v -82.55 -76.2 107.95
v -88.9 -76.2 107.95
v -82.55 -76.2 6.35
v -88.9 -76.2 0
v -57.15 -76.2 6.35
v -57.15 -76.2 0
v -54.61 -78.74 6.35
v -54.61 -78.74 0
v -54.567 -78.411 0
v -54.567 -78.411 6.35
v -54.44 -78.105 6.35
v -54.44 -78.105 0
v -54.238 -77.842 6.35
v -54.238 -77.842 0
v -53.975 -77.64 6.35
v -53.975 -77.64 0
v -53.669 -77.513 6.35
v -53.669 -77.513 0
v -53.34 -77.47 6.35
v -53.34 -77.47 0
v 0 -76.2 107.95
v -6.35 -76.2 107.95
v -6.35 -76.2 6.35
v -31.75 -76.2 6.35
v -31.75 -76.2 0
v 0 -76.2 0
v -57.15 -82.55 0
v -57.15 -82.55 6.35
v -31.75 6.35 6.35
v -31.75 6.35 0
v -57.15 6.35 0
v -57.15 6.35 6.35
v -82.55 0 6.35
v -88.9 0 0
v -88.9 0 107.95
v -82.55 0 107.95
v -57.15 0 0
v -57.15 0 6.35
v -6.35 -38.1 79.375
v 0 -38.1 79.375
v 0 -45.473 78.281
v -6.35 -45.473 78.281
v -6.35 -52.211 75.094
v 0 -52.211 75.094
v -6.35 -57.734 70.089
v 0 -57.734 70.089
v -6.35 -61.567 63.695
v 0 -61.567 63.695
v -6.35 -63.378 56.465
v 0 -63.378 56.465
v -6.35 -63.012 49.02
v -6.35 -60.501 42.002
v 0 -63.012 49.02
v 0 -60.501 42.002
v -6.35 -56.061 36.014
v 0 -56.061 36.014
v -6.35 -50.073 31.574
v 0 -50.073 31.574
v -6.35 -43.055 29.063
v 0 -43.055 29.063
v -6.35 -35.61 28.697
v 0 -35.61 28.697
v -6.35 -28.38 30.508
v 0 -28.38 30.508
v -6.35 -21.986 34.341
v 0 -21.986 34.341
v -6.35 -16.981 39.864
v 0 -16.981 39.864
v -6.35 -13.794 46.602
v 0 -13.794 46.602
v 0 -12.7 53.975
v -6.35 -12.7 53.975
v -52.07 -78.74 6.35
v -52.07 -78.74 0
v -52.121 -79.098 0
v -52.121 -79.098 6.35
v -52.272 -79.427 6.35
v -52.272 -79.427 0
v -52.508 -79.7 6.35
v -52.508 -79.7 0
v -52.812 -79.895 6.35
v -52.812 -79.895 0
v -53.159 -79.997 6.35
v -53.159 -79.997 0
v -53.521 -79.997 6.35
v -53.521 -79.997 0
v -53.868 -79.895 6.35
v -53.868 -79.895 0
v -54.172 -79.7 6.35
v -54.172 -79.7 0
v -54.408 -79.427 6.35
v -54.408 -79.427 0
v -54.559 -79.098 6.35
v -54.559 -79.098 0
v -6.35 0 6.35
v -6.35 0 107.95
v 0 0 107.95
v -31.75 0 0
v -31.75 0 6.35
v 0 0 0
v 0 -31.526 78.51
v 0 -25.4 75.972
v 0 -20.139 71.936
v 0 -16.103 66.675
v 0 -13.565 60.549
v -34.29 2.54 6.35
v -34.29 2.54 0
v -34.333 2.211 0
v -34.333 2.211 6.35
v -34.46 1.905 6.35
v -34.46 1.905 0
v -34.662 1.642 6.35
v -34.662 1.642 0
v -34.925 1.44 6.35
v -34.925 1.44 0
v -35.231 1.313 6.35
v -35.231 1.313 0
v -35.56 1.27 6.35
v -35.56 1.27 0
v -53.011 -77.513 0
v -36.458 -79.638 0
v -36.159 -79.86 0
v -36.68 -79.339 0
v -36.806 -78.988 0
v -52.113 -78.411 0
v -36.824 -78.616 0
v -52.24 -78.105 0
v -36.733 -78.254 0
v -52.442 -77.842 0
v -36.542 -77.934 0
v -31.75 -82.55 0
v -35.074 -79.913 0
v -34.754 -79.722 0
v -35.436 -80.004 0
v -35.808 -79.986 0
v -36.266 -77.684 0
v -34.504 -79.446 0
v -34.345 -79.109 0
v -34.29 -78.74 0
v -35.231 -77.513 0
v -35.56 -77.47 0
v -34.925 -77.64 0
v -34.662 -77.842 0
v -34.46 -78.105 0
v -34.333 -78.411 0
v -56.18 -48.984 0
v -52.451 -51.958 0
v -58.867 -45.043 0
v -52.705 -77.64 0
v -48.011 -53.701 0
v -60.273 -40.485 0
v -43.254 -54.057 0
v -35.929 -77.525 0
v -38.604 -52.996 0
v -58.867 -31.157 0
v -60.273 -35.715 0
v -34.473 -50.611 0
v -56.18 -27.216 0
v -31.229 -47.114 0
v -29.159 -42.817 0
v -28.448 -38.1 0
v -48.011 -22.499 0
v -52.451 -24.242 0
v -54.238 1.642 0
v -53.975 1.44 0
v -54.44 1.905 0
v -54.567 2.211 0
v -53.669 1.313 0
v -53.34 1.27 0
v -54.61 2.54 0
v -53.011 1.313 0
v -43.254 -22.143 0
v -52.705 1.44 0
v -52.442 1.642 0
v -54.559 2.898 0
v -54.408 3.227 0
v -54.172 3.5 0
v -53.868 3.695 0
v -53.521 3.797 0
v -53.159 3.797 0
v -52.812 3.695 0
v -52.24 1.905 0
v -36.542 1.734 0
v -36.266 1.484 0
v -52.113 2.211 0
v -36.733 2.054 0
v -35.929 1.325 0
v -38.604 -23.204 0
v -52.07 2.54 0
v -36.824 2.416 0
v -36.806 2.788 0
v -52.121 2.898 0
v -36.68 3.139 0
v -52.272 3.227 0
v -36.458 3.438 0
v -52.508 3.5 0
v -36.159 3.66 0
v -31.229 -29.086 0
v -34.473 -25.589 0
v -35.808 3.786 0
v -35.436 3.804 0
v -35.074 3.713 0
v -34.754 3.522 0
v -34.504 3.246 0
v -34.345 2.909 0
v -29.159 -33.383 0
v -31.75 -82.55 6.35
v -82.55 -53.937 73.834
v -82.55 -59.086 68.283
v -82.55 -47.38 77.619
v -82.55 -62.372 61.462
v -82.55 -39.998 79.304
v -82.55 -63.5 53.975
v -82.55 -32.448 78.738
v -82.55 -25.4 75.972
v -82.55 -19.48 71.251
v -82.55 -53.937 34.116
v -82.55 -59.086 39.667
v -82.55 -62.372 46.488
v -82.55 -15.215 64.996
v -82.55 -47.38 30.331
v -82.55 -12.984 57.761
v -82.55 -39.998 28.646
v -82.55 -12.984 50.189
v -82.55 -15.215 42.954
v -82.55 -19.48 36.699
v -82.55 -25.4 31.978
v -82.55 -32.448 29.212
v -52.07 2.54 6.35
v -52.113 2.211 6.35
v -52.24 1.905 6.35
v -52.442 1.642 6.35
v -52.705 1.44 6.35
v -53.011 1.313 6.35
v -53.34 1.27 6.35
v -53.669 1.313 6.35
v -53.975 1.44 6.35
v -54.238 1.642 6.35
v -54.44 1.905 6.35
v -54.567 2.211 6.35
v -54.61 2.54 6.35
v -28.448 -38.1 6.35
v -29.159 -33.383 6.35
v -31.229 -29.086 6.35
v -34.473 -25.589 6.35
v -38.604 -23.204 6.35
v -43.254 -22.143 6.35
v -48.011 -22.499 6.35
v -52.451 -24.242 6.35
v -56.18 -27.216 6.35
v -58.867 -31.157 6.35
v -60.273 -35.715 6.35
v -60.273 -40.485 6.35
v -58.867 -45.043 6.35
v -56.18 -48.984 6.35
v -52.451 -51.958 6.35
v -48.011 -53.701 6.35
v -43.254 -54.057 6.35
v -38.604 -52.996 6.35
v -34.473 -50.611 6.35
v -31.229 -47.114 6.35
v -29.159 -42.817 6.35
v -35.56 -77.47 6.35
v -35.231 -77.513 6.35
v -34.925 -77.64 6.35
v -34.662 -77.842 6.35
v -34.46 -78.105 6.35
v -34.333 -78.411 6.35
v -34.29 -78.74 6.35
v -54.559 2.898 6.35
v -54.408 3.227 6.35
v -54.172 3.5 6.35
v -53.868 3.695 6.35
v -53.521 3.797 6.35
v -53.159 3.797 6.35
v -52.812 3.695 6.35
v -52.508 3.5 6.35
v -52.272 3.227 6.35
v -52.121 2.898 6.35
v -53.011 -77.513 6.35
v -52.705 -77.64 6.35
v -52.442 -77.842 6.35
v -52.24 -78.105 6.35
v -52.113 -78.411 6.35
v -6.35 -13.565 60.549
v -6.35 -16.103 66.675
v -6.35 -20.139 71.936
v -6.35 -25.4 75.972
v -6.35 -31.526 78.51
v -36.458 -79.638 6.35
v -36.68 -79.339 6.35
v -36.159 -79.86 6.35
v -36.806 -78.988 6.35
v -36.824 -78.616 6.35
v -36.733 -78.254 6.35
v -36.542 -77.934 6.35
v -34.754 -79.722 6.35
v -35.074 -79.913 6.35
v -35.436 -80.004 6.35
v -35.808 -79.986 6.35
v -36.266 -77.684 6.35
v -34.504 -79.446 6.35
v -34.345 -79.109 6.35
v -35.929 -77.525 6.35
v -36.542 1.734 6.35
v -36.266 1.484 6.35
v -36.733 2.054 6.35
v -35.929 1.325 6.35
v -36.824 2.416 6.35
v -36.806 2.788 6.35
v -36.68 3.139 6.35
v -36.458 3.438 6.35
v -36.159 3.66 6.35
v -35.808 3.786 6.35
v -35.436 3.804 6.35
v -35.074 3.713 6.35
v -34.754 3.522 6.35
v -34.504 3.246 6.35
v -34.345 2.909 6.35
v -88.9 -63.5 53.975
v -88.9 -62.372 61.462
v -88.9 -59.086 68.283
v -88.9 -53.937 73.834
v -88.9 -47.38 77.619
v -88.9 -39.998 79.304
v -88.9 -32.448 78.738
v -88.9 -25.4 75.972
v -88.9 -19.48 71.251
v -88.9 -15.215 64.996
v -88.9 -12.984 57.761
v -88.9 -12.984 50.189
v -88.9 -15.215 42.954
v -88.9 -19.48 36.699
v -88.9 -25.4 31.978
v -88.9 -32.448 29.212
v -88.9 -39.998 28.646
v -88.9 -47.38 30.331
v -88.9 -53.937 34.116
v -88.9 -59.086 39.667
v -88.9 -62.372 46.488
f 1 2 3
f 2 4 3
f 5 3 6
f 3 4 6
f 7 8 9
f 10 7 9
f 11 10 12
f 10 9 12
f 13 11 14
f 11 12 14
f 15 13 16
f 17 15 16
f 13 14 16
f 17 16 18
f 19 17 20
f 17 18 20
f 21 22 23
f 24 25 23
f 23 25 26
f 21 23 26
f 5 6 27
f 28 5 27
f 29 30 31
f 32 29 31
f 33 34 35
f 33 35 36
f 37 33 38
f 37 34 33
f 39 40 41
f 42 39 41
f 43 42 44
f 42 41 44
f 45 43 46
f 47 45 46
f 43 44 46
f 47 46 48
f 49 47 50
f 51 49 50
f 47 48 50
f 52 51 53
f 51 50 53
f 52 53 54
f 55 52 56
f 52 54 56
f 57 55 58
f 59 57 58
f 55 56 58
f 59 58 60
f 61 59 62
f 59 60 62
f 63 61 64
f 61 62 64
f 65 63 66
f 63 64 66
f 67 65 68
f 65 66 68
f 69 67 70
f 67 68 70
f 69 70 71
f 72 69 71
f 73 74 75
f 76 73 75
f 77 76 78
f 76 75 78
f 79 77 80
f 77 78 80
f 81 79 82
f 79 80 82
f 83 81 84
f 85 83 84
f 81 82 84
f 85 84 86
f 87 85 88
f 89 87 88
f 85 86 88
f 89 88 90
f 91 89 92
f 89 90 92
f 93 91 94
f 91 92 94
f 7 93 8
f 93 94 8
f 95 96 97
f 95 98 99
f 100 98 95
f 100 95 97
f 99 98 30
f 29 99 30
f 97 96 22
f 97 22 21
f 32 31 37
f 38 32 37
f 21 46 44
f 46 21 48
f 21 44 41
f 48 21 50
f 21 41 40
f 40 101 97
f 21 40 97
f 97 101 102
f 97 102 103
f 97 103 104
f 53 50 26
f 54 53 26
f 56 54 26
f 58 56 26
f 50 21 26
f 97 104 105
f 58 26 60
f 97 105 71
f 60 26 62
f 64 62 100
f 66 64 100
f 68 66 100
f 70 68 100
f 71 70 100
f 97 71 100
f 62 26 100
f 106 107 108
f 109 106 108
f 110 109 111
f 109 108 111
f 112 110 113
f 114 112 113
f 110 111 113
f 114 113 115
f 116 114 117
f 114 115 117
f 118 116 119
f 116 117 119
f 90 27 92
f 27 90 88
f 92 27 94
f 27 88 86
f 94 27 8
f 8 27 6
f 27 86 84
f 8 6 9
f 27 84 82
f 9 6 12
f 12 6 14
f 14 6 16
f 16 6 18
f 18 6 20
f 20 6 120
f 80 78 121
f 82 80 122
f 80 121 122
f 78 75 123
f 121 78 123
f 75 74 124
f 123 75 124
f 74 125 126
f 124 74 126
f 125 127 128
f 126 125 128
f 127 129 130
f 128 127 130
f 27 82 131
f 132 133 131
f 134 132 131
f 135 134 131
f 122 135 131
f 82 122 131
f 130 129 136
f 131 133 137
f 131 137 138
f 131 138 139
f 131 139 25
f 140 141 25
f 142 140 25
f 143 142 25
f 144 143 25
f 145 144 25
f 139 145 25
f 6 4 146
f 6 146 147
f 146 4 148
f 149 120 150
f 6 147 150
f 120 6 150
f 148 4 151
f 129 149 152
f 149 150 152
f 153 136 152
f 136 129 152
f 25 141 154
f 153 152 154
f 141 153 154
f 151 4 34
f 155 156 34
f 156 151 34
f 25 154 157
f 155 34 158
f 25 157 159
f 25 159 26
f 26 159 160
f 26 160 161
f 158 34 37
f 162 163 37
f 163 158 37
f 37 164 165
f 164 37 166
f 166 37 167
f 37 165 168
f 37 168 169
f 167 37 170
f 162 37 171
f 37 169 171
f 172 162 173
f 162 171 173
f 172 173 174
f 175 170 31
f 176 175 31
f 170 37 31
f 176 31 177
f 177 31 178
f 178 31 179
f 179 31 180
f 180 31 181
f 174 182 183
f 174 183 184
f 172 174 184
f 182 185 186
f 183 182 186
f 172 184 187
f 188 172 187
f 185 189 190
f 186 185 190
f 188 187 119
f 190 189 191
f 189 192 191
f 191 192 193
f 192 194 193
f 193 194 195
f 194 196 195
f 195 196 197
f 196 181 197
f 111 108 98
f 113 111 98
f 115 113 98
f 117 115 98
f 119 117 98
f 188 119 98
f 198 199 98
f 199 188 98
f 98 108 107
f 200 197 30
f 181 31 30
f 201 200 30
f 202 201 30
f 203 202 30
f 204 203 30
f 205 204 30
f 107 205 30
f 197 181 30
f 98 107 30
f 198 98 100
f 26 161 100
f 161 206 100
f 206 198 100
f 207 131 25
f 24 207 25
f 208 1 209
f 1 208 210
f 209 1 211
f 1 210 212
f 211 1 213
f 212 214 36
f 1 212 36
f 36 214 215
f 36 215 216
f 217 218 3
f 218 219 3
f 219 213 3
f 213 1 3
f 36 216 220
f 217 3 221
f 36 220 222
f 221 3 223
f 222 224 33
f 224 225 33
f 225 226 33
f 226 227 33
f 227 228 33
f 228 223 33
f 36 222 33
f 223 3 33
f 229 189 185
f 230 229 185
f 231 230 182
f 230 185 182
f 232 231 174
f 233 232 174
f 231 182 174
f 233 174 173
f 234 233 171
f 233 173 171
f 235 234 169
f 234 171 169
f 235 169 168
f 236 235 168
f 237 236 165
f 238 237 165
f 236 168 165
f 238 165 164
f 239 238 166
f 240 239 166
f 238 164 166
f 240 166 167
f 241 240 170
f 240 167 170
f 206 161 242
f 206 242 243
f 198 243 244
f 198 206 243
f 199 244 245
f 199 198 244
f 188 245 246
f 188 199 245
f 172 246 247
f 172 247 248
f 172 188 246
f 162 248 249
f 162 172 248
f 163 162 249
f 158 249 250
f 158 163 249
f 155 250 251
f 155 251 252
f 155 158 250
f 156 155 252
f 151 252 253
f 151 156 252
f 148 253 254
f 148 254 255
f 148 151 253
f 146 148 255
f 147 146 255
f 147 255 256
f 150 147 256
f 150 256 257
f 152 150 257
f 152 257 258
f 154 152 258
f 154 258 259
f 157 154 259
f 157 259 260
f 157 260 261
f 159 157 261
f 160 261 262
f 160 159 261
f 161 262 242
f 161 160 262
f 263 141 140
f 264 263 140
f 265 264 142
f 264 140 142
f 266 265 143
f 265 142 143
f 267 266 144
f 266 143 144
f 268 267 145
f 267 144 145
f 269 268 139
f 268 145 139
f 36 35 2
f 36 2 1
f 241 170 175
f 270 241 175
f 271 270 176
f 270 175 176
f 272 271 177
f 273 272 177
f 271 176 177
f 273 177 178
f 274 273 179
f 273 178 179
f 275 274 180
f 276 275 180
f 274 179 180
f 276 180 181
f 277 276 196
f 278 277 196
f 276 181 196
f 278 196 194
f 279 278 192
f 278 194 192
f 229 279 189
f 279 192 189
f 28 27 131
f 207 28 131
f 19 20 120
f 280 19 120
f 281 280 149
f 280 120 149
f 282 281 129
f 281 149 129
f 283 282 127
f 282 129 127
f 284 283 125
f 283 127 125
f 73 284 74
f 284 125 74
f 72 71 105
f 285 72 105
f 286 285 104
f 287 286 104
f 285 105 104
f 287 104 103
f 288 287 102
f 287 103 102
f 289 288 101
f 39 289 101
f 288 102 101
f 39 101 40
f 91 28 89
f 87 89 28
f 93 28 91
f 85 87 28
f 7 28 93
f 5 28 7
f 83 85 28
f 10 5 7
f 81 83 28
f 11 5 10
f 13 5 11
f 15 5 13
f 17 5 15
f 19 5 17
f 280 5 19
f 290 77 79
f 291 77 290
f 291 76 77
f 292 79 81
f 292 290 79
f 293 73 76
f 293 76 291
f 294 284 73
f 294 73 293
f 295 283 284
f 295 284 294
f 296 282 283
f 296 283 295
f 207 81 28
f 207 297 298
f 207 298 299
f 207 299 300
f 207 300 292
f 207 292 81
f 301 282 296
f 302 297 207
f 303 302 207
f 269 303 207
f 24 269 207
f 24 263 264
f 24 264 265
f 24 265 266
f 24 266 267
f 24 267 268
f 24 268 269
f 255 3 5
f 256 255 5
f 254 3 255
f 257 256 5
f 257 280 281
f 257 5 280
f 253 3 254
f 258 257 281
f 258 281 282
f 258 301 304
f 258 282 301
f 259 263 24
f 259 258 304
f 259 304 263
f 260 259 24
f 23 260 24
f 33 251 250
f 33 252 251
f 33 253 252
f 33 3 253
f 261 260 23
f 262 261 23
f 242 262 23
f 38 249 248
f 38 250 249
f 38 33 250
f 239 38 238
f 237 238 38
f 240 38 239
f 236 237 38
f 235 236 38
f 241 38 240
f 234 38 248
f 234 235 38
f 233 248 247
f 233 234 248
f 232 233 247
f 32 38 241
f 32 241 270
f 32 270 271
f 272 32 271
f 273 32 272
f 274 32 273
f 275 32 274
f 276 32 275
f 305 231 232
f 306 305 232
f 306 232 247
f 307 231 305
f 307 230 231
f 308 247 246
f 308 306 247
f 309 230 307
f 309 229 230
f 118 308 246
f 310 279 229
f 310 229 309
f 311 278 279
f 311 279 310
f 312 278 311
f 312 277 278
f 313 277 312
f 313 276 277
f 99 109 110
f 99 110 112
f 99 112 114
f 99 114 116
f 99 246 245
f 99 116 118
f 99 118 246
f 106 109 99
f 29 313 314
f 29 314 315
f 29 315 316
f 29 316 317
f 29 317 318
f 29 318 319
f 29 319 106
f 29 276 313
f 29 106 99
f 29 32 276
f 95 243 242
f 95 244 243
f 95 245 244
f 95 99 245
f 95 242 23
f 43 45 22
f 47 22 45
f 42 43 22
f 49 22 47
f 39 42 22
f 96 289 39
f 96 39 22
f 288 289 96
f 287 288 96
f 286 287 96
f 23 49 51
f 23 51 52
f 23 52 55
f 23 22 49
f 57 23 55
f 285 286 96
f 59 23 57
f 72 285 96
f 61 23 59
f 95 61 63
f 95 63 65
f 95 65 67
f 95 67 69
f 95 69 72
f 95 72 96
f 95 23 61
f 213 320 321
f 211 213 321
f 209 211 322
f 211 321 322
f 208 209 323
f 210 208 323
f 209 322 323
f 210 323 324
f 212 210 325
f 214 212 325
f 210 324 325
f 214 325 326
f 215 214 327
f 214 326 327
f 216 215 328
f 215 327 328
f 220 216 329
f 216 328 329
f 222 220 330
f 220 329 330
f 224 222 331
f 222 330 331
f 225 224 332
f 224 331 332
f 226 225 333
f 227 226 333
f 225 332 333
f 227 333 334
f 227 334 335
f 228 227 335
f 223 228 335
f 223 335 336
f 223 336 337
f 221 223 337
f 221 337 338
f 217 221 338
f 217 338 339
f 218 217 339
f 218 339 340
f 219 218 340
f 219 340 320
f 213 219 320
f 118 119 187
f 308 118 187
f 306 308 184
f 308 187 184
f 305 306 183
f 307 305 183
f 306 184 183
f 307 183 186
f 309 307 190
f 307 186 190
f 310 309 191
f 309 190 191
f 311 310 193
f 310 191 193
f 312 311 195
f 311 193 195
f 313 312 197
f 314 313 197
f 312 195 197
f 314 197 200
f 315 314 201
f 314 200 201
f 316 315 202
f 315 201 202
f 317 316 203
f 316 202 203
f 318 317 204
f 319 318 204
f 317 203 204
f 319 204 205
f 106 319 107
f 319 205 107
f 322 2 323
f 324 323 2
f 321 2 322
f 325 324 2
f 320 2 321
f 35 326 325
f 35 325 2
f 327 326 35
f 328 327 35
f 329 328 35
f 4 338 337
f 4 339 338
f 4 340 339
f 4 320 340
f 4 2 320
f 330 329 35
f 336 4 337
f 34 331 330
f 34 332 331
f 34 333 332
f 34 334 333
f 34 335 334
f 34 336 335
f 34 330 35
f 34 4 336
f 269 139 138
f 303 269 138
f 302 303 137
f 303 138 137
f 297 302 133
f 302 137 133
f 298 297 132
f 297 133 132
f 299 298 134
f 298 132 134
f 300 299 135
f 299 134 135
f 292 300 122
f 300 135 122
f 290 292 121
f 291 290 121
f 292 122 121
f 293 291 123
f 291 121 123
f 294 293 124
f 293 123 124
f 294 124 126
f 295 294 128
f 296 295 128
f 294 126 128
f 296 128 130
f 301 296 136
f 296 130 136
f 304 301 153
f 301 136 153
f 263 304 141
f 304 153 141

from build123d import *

# Parameters (mm, degrees)
F0_R     = 16.002
F1_DEPTH = 6.35
F2_W     = 6.35
F2_H     = 76.2
F3_DEPTH = 101.6
F5_DEPTH = 101.6
F6_W     = 6.35
F6_H     = 76.2
F7_DEPTH = 101.6
F9_DEPTH = 25.4


with BuildPart() as f1:
    # F0 (on Top) → F1 (new body)
    with BuildSketch(Plane.XY):
        Polygon((0, -38.1), (0, 0), (-31.75, 0), (-35.56, 0), (-53.34, 0), (-57.15, 0), (-88.9, 0), (-88.9, -76.2), (-57.15, -76.2), (-53.34, -76.2), (-35.56, -76.2), (-31.75, -76.2), (0, -76.2), align=None)
        with Locations((-44.45, -38.1)):
            Circle(F0_R, mode=Mode.SUBTRACT)
        Polygon((-35.56, 0), (-31.75, 0), (-31.75, 2.54), (-31.75, 6.35), (-57.15, 6.35), (-57.15, 2.54), (-57.15, 0), (-53.34, 0), align=None)
        with BuildLine():
            ThreePointArc((-53.34, 1.27), (-54.238026, 1.641974), (-54.61, 2.54))
            ThreePointArc((-54.61, 2.54), (-53.34, 3.81), (-52.07, 2.54))
            ThreePointArc((-52.07, 2.54), (-52.441974, 1.641974), (-53.34, 1.27))
        make_face(mode=Mode.SUBTRACT)
        with BuildLine():
            ThreePointArc((-35.56, 1.27), (-36.458026, 3.438026), (-34.29, 2.54))
            ThreePointArc((-34.29, 2.54), (-34.661974, 1.641974), (-35.56, 1.27))
        make_face(mode=Mode.SUBTRACT)
        Polygon((-31.75, -78.74), (-31.75, -76.2), (-35.56, -76.2), (-53.34, -76.2), (-57.15, -76.2), (-57.15, -78.74), (-57.15, -82.55), (-31.75, -82.55), align=None)
        with BuildLine():
            ThreePointArc((-52.07, -78.74), (-53.34, -80.01), (-54.61, -78.74))
            ThreePointArc((-54.61, -78.74), (-54.238026, -77.841974), (-53.34, -77.47))
            ThreePointArc((-53.34, -77.47), (-52.441974, -77.841974), (-52.07, -78.74))
        make_face(mode=Mode.SUBTRACT)
        with BuildLine():
            ThreePointArc((-35.56, -77.47), (-34.661974, -77.841974), (-34.29, -78.74))
            ThreePointArc((-34.29, -78.74), (-36.458026, -79.638026), (-35.56, -77.47))
        make_face(mode=Mode.SUBTRACT)
    extrude(amount=F1_DEPTH)

    # F2 (on face) → F3 (join)
    with BuildSketch(Plane.XY.offset(6.35)):
        with Locations((-85.725, -38.1)):
            Rectangle(F2_W, F2_H)
    extrude(amount=F3_DEPTH)

    # F4 (on face) → F5 (cut)
    with BuildSketch(Plane(origin=(-88.9, 0, 0), x_dir=(0, -1, 0), z_dir=(-1, 0, 0))):
        with BuildLine():
            ThreePointArc((12.7, 53.975), (38.1, 28.575), (63.5, 53.975))
            ThreePointArc((63.5, 53.975), (38.1, 79.375), (12.7, 53.975))
        make_face()
    extrude(amount=-F5_DEPTH, mode=Mode.SUBTRACT)

    # F6 (on face) → F7 (join)
    with BuildSketch(Plane.XY.offset(6.35)):
        with Locations((-3.175, -38.1)):
            Rectangle(F6_W, F6_H)
    extrude(amount=F7_DEPTH)

    # F8 (on face) → F9 (cut)
    with BuildSketch(Plane.YZ):
        with BuildLine():
            ThreePointArc((-12.7, 53.975), (-20.139488, 71.935512), (-38.1, 79.375))
            ThreePointArc((-38.1, 79.375), (-56.060512, 36.014488), (-12.7, 53.975))
        make_face()
    extrude(amount=-F9_DEPTH, mode=Mode.SUBTRACT)


solid = f1.part
